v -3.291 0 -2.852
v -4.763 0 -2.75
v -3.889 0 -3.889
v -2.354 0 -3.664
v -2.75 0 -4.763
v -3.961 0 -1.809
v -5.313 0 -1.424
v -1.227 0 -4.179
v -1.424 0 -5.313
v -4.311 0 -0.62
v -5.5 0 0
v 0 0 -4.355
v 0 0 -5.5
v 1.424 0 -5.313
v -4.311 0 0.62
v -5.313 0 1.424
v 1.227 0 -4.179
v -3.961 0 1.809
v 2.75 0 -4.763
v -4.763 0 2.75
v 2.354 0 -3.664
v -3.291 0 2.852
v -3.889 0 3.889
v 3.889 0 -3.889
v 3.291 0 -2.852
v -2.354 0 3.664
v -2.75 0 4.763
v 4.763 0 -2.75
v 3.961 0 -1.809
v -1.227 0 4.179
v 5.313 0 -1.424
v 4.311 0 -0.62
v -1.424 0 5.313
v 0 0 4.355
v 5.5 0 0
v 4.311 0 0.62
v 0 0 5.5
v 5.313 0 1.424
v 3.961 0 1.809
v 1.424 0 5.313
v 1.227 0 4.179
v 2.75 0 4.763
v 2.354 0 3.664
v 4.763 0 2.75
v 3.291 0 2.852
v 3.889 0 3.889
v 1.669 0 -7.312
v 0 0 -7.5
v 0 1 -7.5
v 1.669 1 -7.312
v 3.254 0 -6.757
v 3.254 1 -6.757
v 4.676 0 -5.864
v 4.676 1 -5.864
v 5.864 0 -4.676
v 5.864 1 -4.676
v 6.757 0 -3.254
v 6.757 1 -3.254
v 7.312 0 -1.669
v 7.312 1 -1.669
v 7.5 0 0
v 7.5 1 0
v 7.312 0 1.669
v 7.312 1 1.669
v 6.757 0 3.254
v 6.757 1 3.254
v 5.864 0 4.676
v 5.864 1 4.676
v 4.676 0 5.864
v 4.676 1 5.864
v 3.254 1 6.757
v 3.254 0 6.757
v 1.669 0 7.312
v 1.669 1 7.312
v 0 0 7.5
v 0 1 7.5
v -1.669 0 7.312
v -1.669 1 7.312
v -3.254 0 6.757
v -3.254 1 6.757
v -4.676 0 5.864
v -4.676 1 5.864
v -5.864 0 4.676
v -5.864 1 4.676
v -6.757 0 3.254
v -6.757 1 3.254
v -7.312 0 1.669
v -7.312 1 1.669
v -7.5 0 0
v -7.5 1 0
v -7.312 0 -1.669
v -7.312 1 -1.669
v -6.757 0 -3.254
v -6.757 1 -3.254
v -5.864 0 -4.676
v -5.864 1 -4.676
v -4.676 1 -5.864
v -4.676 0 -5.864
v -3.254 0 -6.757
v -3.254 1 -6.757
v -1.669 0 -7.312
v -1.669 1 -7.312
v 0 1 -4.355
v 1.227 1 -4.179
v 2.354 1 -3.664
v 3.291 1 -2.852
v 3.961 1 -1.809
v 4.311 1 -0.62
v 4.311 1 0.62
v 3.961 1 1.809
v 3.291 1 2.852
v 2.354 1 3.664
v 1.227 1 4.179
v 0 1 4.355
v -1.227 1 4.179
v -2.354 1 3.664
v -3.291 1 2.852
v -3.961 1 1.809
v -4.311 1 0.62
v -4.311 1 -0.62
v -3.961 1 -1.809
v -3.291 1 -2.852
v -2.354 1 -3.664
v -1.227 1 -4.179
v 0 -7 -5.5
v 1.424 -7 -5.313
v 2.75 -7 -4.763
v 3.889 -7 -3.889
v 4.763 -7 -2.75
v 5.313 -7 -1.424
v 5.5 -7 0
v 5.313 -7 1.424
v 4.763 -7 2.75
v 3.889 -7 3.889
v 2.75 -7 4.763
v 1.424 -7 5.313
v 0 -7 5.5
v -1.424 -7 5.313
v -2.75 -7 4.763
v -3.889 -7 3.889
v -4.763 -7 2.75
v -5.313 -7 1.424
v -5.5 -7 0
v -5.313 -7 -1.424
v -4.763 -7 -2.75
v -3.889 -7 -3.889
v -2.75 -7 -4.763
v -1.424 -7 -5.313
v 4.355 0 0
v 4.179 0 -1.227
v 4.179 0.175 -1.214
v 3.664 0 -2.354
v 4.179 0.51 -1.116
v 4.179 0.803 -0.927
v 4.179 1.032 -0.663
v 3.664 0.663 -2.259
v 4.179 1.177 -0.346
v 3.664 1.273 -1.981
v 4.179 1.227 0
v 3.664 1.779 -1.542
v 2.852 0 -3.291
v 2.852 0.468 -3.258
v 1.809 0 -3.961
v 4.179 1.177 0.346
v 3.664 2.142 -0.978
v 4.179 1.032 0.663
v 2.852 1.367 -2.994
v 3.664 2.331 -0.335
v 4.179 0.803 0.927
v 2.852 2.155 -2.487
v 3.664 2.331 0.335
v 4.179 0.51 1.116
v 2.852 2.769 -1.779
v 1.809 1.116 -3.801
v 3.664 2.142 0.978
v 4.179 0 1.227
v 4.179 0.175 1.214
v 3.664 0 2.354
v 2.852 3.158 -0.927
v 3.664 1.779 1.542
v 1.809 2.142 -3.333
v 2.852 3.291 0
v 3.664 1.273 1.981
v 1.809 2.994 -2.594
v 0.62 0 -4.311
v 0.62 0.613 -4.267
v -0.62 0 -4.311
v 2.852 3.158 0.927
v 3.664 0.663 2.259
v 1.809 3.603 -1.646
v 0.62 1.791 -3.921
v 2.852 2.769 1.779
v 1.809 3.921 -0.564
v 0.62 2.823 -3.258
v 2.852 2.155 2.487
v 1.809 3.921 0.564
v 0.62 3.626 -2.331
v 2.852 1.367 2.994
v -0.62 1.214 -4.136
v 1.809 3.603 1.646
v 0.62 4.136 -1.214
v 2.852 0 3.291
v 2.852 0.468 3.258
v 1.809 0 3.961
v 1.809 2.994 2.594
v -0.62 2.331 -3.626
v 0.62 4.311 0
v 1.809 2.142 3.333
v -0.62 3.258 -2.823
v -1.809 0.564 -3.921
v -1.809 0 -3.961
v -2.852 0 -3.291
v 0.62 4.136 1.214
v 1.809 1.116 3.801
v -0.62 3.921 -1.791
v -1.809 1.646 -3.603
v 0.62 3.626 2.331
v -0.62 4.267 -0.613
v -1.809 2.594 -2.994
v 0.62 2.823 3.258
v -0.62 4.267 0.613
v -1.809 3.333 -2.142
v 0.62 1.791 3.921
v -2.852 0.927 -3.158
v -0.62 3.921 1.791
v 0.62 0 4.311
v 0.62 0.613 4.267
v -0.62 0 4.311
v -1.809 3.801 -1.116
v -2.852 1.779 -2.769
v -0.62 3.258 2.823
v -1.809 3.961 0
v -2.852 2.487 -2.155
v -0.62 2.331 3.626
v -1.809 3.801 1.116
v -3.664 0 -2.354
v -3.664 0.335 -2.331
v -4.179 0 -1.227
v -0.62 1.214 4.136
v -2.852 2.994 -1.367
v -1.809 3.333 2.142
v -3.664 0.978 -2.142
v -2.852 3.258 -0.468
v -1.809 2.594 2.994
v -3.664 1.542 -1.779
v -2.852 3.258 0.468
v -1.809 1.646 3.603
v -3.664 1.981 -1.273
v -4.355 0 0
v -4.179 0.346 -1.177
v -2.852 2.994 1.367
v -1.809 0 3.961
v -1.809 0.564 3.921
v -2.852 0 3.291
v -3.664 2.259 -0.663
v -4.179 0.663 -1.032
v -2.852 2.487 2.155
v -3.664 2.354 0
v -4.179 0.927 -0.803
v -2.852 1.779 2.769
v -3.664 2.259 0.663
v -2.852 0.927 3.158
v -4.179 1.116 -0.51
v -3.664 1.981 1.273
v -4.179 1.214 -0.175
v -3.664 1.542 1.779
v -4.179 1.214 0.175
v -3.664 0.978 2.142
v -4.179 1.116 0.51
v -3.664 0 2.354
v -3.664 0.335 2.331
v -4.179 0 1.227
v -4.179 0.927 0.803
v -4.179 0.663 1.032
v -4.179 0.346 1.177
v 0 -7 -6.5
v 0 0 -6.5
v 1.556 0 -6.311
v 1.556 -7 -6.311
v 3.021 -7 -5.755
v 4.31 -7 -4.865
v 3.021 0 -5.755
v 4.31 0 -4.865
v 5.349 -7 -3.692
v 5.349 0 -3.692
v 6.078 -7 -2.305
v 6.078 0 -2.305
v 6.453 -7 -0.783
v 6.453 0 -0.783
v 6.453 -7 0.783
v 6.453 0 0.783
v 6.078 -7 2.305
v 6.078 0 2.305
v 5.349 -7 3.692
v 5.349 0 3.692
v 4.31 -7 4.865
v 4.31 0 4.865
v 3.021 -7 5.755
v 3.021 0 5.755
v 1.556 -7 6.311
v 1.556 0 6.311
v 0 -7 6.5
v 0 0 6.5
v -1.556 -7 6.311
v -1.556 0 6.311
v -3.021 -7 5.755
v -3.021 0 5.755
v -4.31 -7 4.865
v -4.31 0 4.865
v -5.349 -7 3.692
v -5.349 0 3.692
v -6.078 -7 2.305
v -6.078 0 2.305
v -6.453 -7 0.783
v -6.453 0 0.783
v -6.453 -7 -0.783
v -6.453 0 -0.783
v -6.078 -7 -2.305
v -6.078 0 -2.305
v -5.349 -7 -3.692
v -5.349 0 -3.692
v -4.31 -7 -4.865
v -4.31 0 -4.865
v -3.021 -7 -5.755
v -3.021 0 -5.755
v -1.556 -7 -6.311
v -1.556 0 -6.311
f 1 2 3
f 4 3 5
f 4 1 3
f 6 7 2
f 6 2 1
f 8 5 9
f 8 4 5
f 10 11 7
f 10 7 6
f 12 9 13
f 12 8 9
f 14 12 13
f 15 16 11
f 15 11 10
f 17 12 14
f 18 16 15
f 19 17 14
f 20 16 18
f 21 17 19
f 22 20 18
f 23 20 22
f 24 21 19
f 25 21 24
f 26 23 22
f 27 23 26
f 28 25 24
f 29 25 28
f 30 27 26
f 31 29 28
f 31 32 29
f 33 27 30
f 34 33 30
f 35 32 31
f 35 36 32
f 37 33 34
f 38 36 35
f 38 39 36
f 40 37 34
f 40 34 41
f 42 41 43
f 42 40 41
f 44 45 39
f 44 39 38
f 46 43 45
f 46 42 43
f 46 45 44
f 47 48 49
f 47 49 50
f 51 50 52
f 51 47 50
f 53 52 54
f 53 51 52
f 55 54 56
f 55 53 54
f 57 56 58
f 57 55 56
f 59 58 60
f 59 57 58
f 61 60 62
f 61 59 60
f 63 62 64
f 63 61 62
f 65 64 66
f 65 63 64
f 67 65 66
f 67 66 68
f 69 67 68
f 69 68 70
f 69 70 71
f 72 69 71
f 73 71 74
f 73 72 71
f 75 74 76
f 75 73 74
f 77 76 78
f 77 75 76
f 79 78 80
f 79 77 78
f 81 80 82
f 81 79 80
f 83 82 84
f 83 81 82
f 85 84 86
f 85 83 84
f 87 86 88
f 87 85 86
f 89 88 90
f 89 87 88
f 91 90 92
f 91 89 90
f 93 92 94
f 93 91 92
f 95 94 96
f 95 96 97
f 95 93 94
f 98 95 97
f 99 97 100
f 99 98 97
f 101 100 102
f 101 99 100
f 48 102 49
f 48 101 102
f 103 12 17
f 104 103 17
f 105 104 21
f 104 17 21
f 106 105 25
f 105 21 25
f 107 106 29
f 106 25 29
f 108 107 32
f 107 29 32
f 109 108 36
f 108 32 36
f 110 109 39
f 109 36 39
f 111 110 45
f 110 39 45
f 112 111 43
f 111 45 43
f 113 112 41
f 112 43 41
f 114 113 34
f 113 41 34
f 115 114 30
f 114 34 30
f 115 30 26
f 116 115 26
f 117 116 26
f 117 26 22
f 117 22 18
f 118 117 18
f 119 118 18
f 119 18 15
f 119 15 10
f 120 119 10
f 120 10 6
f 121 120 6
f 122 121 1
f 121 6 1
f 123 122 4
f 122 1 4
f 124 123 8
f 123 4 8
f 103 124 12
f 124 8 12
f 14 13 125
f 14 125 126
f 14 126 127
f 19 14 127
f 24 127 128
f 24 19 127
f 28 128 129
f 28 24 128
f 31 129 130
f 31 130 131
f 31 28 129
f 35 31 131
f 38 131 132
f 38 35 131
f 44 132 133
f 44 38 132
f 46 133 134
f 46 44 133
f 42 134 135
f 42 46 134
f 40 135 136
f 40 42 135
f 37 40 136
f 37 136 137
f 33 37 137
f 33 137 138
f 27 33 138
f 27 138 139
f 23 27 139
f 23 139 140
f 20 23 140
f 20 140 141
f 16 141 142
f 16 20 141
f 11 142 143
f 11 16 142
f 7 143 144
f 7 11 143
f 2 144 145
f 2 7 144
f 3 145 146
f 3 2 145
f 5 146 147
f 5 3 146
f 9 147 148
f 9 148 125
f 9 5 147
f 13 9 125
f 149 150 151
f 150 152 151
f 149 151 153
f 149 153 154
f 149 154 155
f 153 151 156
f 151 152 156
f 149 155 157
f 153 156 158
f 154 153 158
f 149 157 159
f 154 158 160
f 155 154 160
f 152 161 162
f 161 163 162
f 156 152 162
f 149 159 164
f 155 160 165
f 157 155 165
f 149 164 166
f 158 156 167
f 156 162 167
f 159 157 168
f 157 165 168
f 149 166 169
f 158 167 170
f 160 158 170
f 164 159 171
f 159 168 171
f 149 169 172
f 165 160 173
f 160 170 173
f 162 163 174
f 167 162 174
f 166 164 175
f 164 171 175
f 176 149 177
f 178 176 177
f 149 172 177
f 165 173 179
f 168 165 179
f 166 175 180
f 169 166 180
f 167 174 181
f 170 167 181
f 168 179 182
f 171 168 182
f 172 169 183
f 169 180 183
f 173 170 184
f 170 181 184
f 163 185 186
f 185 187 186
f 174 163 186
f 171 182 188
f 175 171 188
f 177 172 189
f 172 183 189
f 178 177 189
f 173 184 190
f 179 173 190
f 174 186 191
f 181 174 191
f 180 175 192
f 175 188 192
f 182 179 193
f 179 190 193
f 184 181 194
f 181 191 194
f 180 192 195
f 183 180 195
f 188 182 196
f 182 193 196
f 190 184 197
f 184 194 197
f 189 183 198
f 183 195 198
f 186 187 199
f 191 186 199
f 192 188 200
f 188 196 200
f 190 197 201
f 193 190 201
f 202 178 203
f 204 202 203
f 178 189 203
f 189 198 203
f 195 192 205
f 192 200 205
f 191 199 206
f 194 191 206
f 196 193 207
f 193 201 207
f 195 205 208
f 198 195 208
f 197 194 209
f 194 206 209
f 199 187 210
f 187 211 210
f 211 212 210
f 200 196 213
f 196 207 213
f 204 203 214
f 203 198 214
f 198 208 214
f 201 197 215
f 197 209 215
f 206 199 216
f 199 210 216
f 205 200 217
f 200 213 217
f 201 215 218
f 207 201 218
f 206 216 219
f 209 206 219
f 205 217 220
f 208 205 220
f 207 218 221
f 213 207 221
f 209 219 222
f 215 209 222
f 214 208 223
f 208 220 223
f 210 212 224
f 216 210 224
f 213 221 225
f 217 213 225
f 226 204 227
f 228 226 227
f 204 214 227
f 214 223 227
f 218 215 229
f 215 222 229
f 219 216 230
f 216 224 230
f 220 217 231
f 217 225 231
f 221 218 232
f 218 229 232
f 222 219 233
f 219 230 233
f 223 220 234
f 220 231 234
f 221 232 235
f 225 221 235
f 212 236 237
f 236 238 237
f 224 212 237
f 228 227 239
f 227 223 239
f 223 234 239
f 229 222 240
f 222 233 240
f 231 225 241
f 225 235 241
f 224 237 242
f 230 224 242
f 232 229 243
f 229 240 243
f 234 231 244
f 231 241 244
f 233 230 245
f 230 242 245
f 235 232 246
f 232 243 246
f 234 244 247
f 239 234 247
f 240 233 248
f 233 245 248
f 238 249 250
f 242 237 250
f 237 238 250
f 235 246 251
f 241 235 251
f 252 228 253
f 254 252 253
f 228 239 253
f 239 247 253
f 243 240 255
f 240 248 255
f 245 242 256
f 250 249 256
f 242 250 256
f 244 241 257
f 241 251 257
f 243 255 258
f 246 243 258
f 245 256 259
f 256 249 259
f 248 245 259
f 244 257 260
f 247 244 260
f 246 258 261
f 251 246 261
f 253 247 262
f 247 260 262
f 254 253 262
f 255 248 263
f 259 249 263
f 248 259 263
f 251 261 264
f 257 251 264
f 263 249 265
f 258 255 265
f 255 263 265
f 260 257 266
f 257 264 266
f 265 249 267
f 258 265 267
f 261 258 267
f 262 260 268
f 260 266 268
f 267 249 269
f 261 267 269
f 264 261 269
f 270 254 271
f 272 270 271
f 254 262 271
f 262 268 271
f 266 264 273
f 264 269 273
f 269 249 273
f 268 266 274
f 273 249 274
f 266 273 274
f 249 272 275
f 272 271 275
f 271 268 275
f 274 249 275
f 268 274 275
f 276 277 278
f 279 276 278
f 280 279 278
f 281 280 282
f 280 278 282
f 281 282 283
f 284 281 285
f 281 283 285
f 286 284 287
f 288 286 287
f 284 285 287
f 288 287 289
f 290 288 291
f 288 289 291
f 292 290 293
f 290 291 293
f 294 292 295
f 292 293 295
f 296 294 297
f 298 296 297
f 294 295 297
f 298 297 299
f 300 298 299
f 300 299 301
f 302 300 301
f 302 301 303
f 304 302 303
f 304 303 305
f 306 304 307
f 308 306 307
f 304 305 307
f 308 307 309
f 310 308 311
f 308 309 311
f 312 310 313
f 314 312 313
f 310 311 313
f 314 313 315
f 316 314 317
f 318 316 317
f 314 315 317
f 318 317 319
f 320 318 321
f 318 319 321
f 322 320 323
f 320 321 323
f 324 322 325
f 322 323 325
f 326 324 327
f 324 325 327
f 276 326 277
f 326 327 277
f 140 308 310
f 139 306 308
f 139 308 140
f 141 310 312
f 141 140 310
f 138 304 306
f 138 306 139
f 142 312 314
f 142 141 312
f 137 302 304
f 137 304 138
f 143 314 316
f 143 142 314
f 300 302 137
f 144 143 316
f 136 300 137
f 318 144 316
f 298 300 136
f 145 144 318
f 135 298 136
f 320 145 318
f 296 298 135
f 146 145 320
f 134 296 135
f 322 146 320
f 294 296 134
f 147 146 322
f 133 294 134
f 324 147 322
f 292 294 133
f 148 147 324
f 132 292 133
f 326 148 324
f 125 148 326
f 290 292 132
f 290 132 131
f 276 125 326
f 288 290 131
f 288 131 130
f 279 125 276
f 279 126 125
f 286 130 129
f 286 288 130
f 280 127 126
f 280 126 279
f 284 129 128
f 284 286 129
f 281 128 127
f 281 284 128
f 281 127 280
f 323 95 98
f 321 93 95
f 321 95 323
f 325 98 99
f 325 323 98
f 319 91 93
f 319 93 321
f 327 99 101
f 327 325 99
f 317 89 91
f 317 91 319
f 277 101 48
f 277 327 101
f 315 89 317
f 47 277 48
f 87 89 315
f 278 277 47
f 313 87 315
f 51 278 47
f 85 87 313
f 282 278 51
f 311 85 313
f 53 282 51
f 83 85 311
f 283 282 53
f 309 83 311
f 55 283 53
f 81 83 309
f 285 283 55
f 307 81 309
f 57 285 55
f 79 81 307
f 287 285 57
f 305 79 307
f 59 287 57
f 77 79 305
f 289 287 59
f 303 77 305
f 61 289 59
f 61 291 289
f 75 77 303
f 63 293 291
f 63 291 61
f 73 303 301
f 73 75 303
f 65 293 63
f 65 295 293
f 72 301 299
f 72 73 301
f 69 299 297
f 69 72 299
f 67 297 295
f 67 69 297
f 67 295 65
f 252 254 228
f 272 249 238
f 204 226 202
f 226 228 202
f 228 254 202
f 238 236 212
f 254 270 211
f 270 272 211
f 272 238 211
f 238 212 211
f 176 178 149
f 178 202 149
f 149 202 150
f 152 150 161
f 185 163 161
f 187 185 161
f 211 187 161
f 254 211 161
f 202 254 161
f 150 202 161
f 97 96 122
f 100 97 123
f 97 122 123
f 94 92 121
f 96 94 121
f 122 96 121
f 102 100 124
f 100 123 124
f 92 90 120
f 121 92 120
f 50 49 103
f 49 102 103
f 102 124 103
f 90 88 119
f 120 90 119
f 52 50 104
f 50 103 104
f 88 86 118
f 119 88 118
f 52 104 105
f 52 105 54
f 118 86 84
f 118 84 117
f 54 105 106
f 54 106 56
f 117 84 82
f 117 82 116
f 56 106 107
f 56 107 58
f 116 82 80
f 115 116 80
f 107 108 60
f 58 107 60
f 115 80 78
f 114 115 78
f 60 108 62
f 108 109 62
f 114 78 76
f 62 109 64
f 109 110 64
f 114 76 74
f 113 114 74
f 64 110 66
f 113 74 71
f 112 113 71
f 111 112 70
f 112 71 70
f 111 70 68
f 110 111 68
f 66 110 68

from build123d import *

# Parameters (mm, degrees)
REVOLVE_1_ANGLE = 180
SKETCH_5_R      = 7.5
SKETCH_5_R_2    = 4.355
EXTRUDE_1_DEPTH = 1
SKETCH_5_4_R    = 6.5
SKETCH_5_4_R_2  = 5.5
EXTRUDE_2_DEPTH = 7


with BuildPart() as part:
    # 草图1 → 旋转1 (revolve)
    with BuildSketch(Plane(origin=(0, 0, 0), x_dir=(1, 0, 0), z_dir=(0, 1, 0))):
        with BuildLine():
            Line((-4.355, 0), (4.355, 0))
            ThreePointArc((4.355, 0), (0, 4.355), (-4.355, 0))
        make_face()
    revolve(axis=Axis((-4.355, 0, 0), (1, 0, 0)), revolution_arc=REVOLVE_1_ANGLE)


with BuildPart() as body_2:
    # 草图5 → 凸台-拉伸1 (new body)
    with BuildSketch(Plane.XZ):
        Circle(SKETCH_5_R)
        Circle(SKETCH_5_R_2, mode=Mode.SUBTRACT)
    extrude(amount=-EXTRUDE_1_DEPTH)

    # 草图5<4> → 凸台-拉伸2 (add)
    with BuildSketch(Plane.XZ):
        Circle(SKETCH_5_4_R)
        Circle(SKETCH_5_4_R_2, mode=Mode.SUBTRACT)
    extrude(amount=EXTRUDE_2_DEPTH)


solid = Compound([part.part, body_2.part])
